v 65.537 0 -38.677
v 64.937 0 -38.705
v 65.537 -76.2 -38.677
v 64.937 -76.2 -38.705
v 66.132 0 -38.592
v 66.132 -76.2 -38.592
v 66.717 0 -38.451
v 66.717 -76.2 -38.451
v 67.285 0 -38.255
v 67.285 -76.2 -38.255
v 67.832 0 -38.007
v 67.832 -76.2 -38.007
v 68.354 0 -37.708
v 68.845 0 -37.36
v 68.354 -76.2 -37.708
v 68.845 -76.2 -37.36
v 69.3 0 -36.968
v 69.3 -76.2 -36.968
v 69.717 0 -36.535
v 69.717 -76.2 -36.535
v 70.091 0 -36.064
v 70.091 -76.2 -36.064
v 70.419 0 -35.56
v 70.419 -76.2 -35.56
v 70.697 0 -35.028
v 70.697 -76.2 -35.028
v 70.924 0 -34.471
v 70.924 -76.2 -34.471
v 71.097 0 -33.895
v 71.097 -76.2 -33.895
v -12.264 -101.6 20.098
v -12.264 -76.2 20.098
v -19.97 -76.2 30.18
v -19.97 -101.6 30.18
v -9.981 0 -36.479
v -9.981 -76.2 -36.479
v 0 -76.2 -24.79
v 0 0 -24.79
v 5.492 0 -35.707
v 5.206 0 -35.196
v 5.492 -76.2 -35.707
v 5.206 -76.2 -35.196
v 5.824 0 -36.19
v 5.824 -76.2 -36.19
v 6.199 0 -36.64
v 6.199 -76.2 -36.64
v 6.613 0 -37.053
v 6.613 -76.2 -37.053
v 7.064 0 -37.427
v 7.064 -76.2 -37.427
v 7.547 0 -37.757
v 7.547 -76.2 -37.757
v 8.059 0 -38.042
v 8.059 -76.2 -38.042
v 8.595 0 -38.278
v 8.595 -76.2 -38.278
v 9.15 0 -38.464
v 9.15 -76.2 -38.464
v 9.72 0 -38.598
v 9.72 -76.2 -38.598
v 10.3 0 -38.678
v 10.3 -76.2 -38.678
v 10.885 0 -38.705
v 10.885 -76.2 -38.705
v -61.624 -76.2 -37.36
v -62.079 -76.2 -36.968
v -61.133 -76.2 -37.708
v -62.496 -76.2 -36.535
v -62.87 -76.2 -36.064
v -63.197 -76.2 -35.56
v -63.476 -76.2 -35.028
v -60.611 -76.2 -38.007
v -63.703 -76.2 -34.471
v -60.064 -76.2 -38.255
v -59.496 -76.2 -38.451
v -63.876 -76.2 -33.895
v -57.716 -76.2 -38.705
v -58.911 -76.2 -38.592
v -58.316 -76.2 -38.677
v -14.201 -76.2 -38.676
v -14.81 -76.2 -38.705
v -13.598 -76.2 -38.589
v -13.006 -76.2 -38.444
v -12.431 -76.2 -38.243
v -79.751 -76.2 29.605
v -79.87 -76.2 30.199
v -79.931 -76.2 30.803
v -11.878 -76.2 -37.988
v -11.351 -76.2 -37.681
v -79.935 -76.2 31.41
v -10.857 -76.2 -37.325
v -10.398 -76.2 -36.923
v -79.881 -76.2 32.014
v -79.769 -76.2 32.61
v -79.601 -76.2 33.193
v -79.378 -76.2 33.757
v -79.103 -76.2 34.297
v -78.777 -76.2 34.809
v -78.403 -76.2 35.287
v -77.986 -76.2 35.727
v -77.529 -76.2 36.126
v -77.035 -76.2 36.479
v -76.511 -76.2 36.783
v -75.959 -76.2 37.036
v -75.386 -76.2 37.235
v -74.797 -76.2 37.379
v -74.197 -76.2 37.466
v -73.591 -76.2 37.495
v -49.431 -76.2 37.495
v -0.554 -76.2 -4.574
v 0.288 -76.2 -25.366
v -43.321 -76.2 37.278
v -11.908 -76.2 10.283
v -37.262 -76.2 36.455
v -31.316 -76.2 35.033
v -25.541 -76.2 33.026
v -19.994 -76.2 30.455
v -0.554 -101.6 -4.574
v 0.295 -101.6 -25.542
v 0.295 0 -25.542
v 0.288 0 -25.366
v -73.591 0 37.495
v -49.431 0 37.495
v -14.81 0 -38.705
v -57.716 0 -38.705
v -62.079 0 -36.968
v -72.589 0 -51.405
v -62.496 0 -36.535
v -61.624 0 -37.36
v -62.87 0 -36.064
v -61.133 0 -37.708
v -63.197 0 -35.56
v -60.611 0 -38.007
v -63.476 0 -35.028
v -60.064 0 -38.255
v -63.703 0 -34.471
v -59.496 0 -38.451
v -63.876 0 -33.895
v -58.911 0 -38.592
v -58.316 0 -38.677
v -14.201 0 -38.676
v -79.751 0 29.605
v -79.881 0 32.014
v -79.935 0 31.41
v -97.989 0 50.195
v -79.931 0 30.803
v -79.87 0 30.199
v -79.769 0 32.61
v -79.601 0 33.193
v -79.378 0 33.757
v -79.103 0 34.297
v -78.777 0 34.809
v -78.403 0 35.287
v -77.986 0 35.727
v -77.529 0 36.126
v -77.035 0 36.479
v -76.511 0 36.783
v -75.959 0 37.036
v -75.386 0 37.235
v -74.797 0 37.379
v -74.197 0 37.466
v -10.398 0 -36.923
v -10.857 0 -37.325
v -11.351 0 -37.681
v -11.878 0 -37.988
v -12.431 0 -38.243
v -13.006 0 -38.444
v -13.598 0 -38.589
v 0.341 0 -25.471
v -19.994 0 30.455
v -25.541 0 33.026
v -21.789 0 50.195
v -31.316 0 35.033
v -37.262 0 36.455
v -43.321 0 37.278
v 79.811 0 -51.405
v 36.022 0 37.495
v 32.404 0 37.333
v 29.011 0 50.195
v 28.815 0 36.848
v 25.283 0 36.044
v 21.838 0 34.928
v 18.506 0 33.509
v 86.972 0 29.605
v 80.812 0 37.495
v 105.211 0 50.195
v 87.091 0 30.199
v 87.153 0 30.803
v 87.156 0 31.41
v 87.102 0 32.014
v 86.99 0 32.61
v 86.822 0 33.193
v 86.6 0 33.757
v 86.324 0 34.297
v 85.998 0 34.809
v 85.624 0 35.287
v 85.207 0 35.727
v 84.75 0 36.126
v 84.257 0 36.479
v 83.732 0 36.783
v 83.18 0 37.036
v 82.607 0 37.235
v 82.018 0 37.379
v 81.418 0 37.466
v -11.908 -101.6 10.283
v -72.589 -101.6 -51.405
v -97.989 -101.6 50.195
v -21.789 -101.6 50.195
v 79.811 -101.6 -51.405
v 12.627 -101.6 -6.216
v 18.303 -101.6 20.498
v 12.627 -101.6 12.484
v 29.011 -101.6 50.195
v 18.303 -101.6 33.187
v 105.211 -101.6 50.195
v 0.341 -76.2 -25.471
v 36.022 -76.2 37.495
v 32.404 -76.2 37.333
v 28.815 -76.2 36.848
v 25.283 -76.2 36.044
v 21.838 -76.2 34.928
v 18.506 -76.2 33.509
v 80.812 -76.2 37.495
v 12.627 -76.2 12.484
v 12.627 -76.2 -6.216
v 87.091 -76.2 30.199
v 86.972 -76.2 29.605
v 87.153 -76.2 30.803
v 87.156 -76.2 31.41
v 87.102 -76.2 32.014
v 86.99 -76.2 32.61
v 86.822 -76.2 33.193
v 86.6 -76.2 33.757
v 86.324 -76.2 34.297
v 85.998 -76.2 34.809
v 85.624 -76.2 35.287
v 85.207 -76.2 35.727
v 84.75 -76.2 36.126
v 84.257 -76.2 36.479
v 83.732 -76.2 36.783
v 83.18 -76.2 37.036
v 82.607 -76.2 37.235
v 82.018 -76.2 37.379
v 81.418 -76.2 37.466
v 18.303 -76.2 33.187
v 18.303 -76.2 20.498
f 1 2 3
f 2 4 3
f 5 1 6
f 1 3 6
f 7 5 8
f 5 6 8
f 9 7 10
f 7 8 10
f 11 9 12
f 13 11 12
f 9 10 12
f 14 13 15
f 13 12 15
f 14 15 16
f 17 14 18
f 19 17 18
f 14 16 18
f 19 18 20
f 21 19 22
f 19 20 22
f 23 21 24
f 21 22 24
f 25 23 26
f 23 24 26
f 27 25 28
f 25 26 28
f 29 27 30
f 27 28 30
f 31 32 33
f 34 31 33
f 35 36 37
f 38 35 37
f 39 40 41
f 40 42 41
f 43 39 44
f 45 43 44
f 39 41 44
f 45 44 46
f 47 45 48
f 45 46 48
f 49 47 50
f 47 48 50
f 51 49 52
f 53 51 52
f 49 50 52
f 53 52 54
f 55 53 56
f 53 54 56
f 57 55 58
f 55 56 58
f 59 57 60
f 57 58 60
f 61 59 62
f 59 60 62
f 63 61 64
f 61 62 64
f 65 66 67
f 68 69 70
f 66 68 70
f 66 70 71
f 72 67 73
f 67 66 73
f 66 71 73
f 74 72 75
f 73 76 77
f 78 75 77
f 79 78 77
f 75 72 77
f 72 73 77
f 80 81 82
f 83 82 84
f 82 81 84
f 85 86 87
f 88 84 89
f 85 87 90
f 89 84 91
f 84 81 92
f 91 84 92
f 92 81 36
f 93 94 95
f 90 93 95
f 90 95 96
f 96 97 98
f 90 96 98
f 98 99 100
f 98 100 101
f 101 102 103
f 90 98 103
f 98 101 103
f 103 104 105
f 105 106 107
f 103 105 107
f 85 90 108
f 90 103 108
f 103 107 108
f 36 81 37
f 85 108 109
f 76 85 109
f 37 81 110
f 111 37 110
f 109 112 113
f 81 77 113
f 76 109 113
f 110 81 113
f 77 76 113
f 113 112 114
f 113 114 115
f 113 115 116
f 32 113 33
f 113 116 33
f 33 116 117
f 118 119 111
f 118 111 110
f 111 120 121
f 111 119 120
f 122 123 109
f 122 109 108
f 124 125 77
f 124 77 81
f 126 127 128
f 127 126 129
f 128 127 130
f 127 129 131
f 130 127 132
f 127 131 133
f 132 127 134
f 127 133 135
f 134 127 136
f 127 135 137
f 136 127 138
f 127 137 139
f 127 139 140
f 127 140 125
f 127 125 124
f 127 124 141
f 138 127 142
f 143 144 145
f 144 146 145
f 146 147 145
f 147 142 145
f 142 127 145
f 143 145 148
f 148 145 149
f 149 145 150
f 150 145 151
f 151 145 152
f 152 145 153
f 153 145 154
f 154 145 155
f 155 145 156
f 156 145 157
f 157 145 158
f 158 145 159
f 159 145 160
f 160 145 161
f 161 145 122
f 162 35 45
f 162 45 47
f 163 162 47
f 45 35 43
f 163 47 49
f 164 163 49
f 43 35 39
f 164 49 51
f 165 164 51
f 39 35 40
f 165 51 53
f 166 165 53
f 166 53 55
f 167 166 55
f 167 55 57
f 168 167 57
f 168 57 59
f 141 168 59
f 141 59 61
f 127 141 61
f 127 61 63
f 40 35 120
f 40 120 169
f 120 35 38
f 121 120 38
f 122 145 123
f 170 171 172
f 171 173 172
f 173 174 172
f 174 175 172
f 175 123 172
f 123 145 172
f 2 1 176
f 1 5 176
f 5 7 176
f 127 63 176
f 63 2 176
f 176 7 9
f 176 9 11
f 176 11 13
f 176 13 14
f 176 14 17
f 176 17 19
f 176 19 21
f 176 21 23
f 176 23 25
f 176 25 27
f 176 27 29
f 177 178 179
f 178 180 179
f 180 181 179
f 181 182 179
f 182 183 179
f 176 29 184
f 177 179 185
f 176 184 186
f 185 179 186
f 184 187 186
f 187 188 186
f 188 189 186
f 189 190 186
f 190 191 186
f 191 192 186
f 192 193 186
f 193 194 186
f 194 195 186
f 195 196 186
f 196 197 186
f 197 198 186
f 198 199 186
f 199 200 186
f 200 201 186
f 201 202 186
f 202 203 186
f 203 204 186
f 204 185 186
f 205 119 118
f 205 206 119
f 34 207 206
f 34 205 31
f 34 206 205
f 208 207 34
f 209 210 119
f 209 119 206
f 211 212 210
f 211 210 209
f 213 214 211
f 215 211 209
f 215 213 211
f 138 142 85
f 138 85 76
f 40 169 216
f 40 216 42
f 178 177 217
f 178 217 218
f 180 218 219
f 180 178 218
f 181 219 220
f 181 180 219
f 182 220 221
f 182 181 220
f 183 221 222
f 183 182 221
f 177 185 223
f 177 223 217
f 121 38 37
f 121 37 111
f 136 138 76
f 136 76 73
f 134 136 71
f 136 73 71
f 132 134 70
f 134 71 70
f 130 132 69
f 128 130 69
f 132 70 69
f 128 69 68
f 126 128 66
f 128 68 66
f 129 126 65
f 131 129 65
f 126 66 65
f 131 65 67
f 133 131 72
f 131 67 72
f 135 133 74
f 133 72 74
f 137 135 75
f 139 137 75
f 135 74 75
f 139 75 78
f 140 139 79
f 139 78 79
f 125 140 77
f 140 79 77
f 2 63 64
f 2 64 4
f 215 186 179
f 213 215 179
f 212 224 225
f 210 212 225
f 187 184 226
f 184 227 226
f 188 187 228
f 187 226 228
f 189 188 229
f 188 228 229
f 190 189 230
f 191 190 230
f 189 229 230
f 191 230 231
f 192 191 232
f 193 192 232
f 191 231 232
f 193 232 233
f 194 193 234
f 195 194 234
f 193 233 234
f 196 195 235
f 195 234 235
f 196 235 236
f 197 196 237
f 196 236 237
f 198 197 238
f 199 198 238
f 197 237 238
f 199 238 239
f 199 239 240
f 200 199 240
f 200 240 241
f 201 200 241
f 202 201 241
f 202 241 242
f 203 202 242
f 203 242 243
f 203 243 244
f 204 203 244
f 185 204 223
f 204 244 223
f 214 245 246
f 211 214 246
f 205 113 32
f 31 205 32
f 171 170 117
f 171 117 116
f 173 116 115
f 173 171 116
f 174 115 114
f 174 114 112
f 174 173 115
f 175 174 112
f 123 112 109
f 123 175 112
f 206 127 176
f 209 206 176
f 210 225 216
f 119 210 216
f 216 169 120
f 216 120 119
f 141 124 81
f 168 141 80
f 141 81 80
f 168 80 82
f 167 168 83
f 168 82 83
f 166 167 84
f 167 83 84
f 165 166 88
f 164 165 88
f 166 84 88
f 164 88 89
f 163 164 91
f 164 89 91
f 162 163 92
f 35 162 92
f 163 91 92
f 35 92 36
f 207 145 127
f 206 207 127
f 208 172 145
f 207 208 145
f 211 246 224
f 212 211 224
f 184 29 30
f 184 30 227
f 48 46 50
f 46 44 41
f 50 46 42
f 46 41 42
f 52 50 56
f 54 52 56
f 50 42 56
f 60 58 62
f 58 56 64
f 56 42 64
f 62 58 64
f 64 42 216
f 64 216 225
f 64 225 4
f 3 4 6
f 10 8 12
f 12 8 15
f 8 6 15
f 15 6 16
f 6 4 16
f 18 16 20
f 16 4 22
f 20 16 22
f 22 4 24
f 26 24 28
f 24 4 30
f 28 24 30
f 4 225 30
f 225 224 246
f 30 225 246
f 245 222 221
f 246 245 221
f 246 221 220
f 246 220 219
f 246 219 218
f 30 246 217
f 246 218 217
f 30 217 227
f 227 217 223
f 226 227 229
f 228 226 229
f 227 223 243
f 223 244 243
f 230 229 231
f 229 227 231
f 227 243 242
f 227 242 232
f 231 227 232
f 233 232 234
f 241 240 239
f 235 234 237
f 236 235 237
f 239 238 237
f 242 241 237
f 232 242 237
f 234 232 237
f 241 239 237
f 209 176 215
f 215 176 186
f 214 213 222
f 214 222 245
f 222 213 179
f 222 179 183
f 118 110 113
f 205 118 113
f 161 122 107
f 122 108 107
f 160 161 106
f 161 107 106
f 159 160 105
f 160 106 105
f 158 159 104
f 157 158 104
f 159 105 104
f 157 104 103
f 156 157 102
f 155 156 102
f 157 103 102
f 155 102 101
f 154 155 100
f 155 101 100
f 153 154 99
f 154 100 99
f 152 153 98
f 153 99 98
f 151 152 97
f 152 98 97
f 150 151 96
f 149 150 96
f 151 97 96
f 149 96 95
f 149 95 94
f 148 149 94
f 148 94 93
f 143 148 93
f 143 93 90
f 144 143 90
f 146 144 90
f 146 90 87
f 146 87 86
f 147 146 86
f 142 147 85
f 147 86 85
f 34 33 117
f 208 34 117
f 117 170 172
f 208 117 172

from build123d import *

# Parameters (mm, degrees)
F1_DEPTH = 101.6
F3_DEPTH = 76.2
F4_R     = 6.35


with BuildPart() as f1:
    # F0 (on Front) → F1 (new body)
    with BuildSketch(Plane.XZ):
        Polygon((-21.789443, 50.194677), (-97.989443, 50.194677), (-72.589443, -51.405323), (79.810557, -51.405323), (105.210557, 50.194677), (29.010557, 50.194677), (18.30329, 33.187184), (18.30329, 20.498006), (12.626553, 12.483789), (12.626553, -6.216054), (0.295312, -25.542488), (-0.553554, -4.574321), (-11.90842, 10.283374), (-12.26442, 20.09797), (-19.969508, 30.179977), align=None)
    extrude(amount=F1_DEPTH)

    # F2 (on Front) → F3 (cut)
    with BuildSketch(Plane.XZ):
        with BuildLine():
            Line((-49.430657, 37.494677), (-81.723583, 37.494677))
            Line((-81.723583, 37.494677), (-62.673583, -38.705323))
            Line((-62.673583, -38.705323), (-11.882212, -38.705323))
            Line((-11.882212, -38.705323), (0, -24.789929))
            Line((0, -24.789929), (6.961702, -38.705323))
            Line((6.961702, -38.705323), (69.894697, -38.705323))
            Line((69.894697, -38.705323), (88.944697, 37.494677))
            Line((88.944697, 37.494677), (36.022353, 37.494677))
            ThreePointArc((36.022353, 37.494677), (27.04006, 36.48556), (18.505591, 33.508521))
            Line((18.505591, 33.508521), (-19.994486, 30.454669))
            ThreePointArc((-19.994486, 30.454669), (-34.271665, 35.818222), (-49.430657, 37.494677))
        make_face()
    extrude(amount=F3_DEPTH, mode=Mode.SUBTRACT)

    # F4
    f4_edges = [f1.edges().sort_by_distance(p)[0] for p in [
        (-11.882212, -38.1, -38.705323),
        (6.961702, -38.1, -38.705323),
        (-62.673583, -38.1, -38.705323),
        (69.894697, -38.1, -38.705323),
        (88.944697, -38.1, 37.494677),
        (-81.723583, -38.1, 37.494677),
    ]]
    fillet(f4_edges, radius=F4_R)


solid = f1.part
